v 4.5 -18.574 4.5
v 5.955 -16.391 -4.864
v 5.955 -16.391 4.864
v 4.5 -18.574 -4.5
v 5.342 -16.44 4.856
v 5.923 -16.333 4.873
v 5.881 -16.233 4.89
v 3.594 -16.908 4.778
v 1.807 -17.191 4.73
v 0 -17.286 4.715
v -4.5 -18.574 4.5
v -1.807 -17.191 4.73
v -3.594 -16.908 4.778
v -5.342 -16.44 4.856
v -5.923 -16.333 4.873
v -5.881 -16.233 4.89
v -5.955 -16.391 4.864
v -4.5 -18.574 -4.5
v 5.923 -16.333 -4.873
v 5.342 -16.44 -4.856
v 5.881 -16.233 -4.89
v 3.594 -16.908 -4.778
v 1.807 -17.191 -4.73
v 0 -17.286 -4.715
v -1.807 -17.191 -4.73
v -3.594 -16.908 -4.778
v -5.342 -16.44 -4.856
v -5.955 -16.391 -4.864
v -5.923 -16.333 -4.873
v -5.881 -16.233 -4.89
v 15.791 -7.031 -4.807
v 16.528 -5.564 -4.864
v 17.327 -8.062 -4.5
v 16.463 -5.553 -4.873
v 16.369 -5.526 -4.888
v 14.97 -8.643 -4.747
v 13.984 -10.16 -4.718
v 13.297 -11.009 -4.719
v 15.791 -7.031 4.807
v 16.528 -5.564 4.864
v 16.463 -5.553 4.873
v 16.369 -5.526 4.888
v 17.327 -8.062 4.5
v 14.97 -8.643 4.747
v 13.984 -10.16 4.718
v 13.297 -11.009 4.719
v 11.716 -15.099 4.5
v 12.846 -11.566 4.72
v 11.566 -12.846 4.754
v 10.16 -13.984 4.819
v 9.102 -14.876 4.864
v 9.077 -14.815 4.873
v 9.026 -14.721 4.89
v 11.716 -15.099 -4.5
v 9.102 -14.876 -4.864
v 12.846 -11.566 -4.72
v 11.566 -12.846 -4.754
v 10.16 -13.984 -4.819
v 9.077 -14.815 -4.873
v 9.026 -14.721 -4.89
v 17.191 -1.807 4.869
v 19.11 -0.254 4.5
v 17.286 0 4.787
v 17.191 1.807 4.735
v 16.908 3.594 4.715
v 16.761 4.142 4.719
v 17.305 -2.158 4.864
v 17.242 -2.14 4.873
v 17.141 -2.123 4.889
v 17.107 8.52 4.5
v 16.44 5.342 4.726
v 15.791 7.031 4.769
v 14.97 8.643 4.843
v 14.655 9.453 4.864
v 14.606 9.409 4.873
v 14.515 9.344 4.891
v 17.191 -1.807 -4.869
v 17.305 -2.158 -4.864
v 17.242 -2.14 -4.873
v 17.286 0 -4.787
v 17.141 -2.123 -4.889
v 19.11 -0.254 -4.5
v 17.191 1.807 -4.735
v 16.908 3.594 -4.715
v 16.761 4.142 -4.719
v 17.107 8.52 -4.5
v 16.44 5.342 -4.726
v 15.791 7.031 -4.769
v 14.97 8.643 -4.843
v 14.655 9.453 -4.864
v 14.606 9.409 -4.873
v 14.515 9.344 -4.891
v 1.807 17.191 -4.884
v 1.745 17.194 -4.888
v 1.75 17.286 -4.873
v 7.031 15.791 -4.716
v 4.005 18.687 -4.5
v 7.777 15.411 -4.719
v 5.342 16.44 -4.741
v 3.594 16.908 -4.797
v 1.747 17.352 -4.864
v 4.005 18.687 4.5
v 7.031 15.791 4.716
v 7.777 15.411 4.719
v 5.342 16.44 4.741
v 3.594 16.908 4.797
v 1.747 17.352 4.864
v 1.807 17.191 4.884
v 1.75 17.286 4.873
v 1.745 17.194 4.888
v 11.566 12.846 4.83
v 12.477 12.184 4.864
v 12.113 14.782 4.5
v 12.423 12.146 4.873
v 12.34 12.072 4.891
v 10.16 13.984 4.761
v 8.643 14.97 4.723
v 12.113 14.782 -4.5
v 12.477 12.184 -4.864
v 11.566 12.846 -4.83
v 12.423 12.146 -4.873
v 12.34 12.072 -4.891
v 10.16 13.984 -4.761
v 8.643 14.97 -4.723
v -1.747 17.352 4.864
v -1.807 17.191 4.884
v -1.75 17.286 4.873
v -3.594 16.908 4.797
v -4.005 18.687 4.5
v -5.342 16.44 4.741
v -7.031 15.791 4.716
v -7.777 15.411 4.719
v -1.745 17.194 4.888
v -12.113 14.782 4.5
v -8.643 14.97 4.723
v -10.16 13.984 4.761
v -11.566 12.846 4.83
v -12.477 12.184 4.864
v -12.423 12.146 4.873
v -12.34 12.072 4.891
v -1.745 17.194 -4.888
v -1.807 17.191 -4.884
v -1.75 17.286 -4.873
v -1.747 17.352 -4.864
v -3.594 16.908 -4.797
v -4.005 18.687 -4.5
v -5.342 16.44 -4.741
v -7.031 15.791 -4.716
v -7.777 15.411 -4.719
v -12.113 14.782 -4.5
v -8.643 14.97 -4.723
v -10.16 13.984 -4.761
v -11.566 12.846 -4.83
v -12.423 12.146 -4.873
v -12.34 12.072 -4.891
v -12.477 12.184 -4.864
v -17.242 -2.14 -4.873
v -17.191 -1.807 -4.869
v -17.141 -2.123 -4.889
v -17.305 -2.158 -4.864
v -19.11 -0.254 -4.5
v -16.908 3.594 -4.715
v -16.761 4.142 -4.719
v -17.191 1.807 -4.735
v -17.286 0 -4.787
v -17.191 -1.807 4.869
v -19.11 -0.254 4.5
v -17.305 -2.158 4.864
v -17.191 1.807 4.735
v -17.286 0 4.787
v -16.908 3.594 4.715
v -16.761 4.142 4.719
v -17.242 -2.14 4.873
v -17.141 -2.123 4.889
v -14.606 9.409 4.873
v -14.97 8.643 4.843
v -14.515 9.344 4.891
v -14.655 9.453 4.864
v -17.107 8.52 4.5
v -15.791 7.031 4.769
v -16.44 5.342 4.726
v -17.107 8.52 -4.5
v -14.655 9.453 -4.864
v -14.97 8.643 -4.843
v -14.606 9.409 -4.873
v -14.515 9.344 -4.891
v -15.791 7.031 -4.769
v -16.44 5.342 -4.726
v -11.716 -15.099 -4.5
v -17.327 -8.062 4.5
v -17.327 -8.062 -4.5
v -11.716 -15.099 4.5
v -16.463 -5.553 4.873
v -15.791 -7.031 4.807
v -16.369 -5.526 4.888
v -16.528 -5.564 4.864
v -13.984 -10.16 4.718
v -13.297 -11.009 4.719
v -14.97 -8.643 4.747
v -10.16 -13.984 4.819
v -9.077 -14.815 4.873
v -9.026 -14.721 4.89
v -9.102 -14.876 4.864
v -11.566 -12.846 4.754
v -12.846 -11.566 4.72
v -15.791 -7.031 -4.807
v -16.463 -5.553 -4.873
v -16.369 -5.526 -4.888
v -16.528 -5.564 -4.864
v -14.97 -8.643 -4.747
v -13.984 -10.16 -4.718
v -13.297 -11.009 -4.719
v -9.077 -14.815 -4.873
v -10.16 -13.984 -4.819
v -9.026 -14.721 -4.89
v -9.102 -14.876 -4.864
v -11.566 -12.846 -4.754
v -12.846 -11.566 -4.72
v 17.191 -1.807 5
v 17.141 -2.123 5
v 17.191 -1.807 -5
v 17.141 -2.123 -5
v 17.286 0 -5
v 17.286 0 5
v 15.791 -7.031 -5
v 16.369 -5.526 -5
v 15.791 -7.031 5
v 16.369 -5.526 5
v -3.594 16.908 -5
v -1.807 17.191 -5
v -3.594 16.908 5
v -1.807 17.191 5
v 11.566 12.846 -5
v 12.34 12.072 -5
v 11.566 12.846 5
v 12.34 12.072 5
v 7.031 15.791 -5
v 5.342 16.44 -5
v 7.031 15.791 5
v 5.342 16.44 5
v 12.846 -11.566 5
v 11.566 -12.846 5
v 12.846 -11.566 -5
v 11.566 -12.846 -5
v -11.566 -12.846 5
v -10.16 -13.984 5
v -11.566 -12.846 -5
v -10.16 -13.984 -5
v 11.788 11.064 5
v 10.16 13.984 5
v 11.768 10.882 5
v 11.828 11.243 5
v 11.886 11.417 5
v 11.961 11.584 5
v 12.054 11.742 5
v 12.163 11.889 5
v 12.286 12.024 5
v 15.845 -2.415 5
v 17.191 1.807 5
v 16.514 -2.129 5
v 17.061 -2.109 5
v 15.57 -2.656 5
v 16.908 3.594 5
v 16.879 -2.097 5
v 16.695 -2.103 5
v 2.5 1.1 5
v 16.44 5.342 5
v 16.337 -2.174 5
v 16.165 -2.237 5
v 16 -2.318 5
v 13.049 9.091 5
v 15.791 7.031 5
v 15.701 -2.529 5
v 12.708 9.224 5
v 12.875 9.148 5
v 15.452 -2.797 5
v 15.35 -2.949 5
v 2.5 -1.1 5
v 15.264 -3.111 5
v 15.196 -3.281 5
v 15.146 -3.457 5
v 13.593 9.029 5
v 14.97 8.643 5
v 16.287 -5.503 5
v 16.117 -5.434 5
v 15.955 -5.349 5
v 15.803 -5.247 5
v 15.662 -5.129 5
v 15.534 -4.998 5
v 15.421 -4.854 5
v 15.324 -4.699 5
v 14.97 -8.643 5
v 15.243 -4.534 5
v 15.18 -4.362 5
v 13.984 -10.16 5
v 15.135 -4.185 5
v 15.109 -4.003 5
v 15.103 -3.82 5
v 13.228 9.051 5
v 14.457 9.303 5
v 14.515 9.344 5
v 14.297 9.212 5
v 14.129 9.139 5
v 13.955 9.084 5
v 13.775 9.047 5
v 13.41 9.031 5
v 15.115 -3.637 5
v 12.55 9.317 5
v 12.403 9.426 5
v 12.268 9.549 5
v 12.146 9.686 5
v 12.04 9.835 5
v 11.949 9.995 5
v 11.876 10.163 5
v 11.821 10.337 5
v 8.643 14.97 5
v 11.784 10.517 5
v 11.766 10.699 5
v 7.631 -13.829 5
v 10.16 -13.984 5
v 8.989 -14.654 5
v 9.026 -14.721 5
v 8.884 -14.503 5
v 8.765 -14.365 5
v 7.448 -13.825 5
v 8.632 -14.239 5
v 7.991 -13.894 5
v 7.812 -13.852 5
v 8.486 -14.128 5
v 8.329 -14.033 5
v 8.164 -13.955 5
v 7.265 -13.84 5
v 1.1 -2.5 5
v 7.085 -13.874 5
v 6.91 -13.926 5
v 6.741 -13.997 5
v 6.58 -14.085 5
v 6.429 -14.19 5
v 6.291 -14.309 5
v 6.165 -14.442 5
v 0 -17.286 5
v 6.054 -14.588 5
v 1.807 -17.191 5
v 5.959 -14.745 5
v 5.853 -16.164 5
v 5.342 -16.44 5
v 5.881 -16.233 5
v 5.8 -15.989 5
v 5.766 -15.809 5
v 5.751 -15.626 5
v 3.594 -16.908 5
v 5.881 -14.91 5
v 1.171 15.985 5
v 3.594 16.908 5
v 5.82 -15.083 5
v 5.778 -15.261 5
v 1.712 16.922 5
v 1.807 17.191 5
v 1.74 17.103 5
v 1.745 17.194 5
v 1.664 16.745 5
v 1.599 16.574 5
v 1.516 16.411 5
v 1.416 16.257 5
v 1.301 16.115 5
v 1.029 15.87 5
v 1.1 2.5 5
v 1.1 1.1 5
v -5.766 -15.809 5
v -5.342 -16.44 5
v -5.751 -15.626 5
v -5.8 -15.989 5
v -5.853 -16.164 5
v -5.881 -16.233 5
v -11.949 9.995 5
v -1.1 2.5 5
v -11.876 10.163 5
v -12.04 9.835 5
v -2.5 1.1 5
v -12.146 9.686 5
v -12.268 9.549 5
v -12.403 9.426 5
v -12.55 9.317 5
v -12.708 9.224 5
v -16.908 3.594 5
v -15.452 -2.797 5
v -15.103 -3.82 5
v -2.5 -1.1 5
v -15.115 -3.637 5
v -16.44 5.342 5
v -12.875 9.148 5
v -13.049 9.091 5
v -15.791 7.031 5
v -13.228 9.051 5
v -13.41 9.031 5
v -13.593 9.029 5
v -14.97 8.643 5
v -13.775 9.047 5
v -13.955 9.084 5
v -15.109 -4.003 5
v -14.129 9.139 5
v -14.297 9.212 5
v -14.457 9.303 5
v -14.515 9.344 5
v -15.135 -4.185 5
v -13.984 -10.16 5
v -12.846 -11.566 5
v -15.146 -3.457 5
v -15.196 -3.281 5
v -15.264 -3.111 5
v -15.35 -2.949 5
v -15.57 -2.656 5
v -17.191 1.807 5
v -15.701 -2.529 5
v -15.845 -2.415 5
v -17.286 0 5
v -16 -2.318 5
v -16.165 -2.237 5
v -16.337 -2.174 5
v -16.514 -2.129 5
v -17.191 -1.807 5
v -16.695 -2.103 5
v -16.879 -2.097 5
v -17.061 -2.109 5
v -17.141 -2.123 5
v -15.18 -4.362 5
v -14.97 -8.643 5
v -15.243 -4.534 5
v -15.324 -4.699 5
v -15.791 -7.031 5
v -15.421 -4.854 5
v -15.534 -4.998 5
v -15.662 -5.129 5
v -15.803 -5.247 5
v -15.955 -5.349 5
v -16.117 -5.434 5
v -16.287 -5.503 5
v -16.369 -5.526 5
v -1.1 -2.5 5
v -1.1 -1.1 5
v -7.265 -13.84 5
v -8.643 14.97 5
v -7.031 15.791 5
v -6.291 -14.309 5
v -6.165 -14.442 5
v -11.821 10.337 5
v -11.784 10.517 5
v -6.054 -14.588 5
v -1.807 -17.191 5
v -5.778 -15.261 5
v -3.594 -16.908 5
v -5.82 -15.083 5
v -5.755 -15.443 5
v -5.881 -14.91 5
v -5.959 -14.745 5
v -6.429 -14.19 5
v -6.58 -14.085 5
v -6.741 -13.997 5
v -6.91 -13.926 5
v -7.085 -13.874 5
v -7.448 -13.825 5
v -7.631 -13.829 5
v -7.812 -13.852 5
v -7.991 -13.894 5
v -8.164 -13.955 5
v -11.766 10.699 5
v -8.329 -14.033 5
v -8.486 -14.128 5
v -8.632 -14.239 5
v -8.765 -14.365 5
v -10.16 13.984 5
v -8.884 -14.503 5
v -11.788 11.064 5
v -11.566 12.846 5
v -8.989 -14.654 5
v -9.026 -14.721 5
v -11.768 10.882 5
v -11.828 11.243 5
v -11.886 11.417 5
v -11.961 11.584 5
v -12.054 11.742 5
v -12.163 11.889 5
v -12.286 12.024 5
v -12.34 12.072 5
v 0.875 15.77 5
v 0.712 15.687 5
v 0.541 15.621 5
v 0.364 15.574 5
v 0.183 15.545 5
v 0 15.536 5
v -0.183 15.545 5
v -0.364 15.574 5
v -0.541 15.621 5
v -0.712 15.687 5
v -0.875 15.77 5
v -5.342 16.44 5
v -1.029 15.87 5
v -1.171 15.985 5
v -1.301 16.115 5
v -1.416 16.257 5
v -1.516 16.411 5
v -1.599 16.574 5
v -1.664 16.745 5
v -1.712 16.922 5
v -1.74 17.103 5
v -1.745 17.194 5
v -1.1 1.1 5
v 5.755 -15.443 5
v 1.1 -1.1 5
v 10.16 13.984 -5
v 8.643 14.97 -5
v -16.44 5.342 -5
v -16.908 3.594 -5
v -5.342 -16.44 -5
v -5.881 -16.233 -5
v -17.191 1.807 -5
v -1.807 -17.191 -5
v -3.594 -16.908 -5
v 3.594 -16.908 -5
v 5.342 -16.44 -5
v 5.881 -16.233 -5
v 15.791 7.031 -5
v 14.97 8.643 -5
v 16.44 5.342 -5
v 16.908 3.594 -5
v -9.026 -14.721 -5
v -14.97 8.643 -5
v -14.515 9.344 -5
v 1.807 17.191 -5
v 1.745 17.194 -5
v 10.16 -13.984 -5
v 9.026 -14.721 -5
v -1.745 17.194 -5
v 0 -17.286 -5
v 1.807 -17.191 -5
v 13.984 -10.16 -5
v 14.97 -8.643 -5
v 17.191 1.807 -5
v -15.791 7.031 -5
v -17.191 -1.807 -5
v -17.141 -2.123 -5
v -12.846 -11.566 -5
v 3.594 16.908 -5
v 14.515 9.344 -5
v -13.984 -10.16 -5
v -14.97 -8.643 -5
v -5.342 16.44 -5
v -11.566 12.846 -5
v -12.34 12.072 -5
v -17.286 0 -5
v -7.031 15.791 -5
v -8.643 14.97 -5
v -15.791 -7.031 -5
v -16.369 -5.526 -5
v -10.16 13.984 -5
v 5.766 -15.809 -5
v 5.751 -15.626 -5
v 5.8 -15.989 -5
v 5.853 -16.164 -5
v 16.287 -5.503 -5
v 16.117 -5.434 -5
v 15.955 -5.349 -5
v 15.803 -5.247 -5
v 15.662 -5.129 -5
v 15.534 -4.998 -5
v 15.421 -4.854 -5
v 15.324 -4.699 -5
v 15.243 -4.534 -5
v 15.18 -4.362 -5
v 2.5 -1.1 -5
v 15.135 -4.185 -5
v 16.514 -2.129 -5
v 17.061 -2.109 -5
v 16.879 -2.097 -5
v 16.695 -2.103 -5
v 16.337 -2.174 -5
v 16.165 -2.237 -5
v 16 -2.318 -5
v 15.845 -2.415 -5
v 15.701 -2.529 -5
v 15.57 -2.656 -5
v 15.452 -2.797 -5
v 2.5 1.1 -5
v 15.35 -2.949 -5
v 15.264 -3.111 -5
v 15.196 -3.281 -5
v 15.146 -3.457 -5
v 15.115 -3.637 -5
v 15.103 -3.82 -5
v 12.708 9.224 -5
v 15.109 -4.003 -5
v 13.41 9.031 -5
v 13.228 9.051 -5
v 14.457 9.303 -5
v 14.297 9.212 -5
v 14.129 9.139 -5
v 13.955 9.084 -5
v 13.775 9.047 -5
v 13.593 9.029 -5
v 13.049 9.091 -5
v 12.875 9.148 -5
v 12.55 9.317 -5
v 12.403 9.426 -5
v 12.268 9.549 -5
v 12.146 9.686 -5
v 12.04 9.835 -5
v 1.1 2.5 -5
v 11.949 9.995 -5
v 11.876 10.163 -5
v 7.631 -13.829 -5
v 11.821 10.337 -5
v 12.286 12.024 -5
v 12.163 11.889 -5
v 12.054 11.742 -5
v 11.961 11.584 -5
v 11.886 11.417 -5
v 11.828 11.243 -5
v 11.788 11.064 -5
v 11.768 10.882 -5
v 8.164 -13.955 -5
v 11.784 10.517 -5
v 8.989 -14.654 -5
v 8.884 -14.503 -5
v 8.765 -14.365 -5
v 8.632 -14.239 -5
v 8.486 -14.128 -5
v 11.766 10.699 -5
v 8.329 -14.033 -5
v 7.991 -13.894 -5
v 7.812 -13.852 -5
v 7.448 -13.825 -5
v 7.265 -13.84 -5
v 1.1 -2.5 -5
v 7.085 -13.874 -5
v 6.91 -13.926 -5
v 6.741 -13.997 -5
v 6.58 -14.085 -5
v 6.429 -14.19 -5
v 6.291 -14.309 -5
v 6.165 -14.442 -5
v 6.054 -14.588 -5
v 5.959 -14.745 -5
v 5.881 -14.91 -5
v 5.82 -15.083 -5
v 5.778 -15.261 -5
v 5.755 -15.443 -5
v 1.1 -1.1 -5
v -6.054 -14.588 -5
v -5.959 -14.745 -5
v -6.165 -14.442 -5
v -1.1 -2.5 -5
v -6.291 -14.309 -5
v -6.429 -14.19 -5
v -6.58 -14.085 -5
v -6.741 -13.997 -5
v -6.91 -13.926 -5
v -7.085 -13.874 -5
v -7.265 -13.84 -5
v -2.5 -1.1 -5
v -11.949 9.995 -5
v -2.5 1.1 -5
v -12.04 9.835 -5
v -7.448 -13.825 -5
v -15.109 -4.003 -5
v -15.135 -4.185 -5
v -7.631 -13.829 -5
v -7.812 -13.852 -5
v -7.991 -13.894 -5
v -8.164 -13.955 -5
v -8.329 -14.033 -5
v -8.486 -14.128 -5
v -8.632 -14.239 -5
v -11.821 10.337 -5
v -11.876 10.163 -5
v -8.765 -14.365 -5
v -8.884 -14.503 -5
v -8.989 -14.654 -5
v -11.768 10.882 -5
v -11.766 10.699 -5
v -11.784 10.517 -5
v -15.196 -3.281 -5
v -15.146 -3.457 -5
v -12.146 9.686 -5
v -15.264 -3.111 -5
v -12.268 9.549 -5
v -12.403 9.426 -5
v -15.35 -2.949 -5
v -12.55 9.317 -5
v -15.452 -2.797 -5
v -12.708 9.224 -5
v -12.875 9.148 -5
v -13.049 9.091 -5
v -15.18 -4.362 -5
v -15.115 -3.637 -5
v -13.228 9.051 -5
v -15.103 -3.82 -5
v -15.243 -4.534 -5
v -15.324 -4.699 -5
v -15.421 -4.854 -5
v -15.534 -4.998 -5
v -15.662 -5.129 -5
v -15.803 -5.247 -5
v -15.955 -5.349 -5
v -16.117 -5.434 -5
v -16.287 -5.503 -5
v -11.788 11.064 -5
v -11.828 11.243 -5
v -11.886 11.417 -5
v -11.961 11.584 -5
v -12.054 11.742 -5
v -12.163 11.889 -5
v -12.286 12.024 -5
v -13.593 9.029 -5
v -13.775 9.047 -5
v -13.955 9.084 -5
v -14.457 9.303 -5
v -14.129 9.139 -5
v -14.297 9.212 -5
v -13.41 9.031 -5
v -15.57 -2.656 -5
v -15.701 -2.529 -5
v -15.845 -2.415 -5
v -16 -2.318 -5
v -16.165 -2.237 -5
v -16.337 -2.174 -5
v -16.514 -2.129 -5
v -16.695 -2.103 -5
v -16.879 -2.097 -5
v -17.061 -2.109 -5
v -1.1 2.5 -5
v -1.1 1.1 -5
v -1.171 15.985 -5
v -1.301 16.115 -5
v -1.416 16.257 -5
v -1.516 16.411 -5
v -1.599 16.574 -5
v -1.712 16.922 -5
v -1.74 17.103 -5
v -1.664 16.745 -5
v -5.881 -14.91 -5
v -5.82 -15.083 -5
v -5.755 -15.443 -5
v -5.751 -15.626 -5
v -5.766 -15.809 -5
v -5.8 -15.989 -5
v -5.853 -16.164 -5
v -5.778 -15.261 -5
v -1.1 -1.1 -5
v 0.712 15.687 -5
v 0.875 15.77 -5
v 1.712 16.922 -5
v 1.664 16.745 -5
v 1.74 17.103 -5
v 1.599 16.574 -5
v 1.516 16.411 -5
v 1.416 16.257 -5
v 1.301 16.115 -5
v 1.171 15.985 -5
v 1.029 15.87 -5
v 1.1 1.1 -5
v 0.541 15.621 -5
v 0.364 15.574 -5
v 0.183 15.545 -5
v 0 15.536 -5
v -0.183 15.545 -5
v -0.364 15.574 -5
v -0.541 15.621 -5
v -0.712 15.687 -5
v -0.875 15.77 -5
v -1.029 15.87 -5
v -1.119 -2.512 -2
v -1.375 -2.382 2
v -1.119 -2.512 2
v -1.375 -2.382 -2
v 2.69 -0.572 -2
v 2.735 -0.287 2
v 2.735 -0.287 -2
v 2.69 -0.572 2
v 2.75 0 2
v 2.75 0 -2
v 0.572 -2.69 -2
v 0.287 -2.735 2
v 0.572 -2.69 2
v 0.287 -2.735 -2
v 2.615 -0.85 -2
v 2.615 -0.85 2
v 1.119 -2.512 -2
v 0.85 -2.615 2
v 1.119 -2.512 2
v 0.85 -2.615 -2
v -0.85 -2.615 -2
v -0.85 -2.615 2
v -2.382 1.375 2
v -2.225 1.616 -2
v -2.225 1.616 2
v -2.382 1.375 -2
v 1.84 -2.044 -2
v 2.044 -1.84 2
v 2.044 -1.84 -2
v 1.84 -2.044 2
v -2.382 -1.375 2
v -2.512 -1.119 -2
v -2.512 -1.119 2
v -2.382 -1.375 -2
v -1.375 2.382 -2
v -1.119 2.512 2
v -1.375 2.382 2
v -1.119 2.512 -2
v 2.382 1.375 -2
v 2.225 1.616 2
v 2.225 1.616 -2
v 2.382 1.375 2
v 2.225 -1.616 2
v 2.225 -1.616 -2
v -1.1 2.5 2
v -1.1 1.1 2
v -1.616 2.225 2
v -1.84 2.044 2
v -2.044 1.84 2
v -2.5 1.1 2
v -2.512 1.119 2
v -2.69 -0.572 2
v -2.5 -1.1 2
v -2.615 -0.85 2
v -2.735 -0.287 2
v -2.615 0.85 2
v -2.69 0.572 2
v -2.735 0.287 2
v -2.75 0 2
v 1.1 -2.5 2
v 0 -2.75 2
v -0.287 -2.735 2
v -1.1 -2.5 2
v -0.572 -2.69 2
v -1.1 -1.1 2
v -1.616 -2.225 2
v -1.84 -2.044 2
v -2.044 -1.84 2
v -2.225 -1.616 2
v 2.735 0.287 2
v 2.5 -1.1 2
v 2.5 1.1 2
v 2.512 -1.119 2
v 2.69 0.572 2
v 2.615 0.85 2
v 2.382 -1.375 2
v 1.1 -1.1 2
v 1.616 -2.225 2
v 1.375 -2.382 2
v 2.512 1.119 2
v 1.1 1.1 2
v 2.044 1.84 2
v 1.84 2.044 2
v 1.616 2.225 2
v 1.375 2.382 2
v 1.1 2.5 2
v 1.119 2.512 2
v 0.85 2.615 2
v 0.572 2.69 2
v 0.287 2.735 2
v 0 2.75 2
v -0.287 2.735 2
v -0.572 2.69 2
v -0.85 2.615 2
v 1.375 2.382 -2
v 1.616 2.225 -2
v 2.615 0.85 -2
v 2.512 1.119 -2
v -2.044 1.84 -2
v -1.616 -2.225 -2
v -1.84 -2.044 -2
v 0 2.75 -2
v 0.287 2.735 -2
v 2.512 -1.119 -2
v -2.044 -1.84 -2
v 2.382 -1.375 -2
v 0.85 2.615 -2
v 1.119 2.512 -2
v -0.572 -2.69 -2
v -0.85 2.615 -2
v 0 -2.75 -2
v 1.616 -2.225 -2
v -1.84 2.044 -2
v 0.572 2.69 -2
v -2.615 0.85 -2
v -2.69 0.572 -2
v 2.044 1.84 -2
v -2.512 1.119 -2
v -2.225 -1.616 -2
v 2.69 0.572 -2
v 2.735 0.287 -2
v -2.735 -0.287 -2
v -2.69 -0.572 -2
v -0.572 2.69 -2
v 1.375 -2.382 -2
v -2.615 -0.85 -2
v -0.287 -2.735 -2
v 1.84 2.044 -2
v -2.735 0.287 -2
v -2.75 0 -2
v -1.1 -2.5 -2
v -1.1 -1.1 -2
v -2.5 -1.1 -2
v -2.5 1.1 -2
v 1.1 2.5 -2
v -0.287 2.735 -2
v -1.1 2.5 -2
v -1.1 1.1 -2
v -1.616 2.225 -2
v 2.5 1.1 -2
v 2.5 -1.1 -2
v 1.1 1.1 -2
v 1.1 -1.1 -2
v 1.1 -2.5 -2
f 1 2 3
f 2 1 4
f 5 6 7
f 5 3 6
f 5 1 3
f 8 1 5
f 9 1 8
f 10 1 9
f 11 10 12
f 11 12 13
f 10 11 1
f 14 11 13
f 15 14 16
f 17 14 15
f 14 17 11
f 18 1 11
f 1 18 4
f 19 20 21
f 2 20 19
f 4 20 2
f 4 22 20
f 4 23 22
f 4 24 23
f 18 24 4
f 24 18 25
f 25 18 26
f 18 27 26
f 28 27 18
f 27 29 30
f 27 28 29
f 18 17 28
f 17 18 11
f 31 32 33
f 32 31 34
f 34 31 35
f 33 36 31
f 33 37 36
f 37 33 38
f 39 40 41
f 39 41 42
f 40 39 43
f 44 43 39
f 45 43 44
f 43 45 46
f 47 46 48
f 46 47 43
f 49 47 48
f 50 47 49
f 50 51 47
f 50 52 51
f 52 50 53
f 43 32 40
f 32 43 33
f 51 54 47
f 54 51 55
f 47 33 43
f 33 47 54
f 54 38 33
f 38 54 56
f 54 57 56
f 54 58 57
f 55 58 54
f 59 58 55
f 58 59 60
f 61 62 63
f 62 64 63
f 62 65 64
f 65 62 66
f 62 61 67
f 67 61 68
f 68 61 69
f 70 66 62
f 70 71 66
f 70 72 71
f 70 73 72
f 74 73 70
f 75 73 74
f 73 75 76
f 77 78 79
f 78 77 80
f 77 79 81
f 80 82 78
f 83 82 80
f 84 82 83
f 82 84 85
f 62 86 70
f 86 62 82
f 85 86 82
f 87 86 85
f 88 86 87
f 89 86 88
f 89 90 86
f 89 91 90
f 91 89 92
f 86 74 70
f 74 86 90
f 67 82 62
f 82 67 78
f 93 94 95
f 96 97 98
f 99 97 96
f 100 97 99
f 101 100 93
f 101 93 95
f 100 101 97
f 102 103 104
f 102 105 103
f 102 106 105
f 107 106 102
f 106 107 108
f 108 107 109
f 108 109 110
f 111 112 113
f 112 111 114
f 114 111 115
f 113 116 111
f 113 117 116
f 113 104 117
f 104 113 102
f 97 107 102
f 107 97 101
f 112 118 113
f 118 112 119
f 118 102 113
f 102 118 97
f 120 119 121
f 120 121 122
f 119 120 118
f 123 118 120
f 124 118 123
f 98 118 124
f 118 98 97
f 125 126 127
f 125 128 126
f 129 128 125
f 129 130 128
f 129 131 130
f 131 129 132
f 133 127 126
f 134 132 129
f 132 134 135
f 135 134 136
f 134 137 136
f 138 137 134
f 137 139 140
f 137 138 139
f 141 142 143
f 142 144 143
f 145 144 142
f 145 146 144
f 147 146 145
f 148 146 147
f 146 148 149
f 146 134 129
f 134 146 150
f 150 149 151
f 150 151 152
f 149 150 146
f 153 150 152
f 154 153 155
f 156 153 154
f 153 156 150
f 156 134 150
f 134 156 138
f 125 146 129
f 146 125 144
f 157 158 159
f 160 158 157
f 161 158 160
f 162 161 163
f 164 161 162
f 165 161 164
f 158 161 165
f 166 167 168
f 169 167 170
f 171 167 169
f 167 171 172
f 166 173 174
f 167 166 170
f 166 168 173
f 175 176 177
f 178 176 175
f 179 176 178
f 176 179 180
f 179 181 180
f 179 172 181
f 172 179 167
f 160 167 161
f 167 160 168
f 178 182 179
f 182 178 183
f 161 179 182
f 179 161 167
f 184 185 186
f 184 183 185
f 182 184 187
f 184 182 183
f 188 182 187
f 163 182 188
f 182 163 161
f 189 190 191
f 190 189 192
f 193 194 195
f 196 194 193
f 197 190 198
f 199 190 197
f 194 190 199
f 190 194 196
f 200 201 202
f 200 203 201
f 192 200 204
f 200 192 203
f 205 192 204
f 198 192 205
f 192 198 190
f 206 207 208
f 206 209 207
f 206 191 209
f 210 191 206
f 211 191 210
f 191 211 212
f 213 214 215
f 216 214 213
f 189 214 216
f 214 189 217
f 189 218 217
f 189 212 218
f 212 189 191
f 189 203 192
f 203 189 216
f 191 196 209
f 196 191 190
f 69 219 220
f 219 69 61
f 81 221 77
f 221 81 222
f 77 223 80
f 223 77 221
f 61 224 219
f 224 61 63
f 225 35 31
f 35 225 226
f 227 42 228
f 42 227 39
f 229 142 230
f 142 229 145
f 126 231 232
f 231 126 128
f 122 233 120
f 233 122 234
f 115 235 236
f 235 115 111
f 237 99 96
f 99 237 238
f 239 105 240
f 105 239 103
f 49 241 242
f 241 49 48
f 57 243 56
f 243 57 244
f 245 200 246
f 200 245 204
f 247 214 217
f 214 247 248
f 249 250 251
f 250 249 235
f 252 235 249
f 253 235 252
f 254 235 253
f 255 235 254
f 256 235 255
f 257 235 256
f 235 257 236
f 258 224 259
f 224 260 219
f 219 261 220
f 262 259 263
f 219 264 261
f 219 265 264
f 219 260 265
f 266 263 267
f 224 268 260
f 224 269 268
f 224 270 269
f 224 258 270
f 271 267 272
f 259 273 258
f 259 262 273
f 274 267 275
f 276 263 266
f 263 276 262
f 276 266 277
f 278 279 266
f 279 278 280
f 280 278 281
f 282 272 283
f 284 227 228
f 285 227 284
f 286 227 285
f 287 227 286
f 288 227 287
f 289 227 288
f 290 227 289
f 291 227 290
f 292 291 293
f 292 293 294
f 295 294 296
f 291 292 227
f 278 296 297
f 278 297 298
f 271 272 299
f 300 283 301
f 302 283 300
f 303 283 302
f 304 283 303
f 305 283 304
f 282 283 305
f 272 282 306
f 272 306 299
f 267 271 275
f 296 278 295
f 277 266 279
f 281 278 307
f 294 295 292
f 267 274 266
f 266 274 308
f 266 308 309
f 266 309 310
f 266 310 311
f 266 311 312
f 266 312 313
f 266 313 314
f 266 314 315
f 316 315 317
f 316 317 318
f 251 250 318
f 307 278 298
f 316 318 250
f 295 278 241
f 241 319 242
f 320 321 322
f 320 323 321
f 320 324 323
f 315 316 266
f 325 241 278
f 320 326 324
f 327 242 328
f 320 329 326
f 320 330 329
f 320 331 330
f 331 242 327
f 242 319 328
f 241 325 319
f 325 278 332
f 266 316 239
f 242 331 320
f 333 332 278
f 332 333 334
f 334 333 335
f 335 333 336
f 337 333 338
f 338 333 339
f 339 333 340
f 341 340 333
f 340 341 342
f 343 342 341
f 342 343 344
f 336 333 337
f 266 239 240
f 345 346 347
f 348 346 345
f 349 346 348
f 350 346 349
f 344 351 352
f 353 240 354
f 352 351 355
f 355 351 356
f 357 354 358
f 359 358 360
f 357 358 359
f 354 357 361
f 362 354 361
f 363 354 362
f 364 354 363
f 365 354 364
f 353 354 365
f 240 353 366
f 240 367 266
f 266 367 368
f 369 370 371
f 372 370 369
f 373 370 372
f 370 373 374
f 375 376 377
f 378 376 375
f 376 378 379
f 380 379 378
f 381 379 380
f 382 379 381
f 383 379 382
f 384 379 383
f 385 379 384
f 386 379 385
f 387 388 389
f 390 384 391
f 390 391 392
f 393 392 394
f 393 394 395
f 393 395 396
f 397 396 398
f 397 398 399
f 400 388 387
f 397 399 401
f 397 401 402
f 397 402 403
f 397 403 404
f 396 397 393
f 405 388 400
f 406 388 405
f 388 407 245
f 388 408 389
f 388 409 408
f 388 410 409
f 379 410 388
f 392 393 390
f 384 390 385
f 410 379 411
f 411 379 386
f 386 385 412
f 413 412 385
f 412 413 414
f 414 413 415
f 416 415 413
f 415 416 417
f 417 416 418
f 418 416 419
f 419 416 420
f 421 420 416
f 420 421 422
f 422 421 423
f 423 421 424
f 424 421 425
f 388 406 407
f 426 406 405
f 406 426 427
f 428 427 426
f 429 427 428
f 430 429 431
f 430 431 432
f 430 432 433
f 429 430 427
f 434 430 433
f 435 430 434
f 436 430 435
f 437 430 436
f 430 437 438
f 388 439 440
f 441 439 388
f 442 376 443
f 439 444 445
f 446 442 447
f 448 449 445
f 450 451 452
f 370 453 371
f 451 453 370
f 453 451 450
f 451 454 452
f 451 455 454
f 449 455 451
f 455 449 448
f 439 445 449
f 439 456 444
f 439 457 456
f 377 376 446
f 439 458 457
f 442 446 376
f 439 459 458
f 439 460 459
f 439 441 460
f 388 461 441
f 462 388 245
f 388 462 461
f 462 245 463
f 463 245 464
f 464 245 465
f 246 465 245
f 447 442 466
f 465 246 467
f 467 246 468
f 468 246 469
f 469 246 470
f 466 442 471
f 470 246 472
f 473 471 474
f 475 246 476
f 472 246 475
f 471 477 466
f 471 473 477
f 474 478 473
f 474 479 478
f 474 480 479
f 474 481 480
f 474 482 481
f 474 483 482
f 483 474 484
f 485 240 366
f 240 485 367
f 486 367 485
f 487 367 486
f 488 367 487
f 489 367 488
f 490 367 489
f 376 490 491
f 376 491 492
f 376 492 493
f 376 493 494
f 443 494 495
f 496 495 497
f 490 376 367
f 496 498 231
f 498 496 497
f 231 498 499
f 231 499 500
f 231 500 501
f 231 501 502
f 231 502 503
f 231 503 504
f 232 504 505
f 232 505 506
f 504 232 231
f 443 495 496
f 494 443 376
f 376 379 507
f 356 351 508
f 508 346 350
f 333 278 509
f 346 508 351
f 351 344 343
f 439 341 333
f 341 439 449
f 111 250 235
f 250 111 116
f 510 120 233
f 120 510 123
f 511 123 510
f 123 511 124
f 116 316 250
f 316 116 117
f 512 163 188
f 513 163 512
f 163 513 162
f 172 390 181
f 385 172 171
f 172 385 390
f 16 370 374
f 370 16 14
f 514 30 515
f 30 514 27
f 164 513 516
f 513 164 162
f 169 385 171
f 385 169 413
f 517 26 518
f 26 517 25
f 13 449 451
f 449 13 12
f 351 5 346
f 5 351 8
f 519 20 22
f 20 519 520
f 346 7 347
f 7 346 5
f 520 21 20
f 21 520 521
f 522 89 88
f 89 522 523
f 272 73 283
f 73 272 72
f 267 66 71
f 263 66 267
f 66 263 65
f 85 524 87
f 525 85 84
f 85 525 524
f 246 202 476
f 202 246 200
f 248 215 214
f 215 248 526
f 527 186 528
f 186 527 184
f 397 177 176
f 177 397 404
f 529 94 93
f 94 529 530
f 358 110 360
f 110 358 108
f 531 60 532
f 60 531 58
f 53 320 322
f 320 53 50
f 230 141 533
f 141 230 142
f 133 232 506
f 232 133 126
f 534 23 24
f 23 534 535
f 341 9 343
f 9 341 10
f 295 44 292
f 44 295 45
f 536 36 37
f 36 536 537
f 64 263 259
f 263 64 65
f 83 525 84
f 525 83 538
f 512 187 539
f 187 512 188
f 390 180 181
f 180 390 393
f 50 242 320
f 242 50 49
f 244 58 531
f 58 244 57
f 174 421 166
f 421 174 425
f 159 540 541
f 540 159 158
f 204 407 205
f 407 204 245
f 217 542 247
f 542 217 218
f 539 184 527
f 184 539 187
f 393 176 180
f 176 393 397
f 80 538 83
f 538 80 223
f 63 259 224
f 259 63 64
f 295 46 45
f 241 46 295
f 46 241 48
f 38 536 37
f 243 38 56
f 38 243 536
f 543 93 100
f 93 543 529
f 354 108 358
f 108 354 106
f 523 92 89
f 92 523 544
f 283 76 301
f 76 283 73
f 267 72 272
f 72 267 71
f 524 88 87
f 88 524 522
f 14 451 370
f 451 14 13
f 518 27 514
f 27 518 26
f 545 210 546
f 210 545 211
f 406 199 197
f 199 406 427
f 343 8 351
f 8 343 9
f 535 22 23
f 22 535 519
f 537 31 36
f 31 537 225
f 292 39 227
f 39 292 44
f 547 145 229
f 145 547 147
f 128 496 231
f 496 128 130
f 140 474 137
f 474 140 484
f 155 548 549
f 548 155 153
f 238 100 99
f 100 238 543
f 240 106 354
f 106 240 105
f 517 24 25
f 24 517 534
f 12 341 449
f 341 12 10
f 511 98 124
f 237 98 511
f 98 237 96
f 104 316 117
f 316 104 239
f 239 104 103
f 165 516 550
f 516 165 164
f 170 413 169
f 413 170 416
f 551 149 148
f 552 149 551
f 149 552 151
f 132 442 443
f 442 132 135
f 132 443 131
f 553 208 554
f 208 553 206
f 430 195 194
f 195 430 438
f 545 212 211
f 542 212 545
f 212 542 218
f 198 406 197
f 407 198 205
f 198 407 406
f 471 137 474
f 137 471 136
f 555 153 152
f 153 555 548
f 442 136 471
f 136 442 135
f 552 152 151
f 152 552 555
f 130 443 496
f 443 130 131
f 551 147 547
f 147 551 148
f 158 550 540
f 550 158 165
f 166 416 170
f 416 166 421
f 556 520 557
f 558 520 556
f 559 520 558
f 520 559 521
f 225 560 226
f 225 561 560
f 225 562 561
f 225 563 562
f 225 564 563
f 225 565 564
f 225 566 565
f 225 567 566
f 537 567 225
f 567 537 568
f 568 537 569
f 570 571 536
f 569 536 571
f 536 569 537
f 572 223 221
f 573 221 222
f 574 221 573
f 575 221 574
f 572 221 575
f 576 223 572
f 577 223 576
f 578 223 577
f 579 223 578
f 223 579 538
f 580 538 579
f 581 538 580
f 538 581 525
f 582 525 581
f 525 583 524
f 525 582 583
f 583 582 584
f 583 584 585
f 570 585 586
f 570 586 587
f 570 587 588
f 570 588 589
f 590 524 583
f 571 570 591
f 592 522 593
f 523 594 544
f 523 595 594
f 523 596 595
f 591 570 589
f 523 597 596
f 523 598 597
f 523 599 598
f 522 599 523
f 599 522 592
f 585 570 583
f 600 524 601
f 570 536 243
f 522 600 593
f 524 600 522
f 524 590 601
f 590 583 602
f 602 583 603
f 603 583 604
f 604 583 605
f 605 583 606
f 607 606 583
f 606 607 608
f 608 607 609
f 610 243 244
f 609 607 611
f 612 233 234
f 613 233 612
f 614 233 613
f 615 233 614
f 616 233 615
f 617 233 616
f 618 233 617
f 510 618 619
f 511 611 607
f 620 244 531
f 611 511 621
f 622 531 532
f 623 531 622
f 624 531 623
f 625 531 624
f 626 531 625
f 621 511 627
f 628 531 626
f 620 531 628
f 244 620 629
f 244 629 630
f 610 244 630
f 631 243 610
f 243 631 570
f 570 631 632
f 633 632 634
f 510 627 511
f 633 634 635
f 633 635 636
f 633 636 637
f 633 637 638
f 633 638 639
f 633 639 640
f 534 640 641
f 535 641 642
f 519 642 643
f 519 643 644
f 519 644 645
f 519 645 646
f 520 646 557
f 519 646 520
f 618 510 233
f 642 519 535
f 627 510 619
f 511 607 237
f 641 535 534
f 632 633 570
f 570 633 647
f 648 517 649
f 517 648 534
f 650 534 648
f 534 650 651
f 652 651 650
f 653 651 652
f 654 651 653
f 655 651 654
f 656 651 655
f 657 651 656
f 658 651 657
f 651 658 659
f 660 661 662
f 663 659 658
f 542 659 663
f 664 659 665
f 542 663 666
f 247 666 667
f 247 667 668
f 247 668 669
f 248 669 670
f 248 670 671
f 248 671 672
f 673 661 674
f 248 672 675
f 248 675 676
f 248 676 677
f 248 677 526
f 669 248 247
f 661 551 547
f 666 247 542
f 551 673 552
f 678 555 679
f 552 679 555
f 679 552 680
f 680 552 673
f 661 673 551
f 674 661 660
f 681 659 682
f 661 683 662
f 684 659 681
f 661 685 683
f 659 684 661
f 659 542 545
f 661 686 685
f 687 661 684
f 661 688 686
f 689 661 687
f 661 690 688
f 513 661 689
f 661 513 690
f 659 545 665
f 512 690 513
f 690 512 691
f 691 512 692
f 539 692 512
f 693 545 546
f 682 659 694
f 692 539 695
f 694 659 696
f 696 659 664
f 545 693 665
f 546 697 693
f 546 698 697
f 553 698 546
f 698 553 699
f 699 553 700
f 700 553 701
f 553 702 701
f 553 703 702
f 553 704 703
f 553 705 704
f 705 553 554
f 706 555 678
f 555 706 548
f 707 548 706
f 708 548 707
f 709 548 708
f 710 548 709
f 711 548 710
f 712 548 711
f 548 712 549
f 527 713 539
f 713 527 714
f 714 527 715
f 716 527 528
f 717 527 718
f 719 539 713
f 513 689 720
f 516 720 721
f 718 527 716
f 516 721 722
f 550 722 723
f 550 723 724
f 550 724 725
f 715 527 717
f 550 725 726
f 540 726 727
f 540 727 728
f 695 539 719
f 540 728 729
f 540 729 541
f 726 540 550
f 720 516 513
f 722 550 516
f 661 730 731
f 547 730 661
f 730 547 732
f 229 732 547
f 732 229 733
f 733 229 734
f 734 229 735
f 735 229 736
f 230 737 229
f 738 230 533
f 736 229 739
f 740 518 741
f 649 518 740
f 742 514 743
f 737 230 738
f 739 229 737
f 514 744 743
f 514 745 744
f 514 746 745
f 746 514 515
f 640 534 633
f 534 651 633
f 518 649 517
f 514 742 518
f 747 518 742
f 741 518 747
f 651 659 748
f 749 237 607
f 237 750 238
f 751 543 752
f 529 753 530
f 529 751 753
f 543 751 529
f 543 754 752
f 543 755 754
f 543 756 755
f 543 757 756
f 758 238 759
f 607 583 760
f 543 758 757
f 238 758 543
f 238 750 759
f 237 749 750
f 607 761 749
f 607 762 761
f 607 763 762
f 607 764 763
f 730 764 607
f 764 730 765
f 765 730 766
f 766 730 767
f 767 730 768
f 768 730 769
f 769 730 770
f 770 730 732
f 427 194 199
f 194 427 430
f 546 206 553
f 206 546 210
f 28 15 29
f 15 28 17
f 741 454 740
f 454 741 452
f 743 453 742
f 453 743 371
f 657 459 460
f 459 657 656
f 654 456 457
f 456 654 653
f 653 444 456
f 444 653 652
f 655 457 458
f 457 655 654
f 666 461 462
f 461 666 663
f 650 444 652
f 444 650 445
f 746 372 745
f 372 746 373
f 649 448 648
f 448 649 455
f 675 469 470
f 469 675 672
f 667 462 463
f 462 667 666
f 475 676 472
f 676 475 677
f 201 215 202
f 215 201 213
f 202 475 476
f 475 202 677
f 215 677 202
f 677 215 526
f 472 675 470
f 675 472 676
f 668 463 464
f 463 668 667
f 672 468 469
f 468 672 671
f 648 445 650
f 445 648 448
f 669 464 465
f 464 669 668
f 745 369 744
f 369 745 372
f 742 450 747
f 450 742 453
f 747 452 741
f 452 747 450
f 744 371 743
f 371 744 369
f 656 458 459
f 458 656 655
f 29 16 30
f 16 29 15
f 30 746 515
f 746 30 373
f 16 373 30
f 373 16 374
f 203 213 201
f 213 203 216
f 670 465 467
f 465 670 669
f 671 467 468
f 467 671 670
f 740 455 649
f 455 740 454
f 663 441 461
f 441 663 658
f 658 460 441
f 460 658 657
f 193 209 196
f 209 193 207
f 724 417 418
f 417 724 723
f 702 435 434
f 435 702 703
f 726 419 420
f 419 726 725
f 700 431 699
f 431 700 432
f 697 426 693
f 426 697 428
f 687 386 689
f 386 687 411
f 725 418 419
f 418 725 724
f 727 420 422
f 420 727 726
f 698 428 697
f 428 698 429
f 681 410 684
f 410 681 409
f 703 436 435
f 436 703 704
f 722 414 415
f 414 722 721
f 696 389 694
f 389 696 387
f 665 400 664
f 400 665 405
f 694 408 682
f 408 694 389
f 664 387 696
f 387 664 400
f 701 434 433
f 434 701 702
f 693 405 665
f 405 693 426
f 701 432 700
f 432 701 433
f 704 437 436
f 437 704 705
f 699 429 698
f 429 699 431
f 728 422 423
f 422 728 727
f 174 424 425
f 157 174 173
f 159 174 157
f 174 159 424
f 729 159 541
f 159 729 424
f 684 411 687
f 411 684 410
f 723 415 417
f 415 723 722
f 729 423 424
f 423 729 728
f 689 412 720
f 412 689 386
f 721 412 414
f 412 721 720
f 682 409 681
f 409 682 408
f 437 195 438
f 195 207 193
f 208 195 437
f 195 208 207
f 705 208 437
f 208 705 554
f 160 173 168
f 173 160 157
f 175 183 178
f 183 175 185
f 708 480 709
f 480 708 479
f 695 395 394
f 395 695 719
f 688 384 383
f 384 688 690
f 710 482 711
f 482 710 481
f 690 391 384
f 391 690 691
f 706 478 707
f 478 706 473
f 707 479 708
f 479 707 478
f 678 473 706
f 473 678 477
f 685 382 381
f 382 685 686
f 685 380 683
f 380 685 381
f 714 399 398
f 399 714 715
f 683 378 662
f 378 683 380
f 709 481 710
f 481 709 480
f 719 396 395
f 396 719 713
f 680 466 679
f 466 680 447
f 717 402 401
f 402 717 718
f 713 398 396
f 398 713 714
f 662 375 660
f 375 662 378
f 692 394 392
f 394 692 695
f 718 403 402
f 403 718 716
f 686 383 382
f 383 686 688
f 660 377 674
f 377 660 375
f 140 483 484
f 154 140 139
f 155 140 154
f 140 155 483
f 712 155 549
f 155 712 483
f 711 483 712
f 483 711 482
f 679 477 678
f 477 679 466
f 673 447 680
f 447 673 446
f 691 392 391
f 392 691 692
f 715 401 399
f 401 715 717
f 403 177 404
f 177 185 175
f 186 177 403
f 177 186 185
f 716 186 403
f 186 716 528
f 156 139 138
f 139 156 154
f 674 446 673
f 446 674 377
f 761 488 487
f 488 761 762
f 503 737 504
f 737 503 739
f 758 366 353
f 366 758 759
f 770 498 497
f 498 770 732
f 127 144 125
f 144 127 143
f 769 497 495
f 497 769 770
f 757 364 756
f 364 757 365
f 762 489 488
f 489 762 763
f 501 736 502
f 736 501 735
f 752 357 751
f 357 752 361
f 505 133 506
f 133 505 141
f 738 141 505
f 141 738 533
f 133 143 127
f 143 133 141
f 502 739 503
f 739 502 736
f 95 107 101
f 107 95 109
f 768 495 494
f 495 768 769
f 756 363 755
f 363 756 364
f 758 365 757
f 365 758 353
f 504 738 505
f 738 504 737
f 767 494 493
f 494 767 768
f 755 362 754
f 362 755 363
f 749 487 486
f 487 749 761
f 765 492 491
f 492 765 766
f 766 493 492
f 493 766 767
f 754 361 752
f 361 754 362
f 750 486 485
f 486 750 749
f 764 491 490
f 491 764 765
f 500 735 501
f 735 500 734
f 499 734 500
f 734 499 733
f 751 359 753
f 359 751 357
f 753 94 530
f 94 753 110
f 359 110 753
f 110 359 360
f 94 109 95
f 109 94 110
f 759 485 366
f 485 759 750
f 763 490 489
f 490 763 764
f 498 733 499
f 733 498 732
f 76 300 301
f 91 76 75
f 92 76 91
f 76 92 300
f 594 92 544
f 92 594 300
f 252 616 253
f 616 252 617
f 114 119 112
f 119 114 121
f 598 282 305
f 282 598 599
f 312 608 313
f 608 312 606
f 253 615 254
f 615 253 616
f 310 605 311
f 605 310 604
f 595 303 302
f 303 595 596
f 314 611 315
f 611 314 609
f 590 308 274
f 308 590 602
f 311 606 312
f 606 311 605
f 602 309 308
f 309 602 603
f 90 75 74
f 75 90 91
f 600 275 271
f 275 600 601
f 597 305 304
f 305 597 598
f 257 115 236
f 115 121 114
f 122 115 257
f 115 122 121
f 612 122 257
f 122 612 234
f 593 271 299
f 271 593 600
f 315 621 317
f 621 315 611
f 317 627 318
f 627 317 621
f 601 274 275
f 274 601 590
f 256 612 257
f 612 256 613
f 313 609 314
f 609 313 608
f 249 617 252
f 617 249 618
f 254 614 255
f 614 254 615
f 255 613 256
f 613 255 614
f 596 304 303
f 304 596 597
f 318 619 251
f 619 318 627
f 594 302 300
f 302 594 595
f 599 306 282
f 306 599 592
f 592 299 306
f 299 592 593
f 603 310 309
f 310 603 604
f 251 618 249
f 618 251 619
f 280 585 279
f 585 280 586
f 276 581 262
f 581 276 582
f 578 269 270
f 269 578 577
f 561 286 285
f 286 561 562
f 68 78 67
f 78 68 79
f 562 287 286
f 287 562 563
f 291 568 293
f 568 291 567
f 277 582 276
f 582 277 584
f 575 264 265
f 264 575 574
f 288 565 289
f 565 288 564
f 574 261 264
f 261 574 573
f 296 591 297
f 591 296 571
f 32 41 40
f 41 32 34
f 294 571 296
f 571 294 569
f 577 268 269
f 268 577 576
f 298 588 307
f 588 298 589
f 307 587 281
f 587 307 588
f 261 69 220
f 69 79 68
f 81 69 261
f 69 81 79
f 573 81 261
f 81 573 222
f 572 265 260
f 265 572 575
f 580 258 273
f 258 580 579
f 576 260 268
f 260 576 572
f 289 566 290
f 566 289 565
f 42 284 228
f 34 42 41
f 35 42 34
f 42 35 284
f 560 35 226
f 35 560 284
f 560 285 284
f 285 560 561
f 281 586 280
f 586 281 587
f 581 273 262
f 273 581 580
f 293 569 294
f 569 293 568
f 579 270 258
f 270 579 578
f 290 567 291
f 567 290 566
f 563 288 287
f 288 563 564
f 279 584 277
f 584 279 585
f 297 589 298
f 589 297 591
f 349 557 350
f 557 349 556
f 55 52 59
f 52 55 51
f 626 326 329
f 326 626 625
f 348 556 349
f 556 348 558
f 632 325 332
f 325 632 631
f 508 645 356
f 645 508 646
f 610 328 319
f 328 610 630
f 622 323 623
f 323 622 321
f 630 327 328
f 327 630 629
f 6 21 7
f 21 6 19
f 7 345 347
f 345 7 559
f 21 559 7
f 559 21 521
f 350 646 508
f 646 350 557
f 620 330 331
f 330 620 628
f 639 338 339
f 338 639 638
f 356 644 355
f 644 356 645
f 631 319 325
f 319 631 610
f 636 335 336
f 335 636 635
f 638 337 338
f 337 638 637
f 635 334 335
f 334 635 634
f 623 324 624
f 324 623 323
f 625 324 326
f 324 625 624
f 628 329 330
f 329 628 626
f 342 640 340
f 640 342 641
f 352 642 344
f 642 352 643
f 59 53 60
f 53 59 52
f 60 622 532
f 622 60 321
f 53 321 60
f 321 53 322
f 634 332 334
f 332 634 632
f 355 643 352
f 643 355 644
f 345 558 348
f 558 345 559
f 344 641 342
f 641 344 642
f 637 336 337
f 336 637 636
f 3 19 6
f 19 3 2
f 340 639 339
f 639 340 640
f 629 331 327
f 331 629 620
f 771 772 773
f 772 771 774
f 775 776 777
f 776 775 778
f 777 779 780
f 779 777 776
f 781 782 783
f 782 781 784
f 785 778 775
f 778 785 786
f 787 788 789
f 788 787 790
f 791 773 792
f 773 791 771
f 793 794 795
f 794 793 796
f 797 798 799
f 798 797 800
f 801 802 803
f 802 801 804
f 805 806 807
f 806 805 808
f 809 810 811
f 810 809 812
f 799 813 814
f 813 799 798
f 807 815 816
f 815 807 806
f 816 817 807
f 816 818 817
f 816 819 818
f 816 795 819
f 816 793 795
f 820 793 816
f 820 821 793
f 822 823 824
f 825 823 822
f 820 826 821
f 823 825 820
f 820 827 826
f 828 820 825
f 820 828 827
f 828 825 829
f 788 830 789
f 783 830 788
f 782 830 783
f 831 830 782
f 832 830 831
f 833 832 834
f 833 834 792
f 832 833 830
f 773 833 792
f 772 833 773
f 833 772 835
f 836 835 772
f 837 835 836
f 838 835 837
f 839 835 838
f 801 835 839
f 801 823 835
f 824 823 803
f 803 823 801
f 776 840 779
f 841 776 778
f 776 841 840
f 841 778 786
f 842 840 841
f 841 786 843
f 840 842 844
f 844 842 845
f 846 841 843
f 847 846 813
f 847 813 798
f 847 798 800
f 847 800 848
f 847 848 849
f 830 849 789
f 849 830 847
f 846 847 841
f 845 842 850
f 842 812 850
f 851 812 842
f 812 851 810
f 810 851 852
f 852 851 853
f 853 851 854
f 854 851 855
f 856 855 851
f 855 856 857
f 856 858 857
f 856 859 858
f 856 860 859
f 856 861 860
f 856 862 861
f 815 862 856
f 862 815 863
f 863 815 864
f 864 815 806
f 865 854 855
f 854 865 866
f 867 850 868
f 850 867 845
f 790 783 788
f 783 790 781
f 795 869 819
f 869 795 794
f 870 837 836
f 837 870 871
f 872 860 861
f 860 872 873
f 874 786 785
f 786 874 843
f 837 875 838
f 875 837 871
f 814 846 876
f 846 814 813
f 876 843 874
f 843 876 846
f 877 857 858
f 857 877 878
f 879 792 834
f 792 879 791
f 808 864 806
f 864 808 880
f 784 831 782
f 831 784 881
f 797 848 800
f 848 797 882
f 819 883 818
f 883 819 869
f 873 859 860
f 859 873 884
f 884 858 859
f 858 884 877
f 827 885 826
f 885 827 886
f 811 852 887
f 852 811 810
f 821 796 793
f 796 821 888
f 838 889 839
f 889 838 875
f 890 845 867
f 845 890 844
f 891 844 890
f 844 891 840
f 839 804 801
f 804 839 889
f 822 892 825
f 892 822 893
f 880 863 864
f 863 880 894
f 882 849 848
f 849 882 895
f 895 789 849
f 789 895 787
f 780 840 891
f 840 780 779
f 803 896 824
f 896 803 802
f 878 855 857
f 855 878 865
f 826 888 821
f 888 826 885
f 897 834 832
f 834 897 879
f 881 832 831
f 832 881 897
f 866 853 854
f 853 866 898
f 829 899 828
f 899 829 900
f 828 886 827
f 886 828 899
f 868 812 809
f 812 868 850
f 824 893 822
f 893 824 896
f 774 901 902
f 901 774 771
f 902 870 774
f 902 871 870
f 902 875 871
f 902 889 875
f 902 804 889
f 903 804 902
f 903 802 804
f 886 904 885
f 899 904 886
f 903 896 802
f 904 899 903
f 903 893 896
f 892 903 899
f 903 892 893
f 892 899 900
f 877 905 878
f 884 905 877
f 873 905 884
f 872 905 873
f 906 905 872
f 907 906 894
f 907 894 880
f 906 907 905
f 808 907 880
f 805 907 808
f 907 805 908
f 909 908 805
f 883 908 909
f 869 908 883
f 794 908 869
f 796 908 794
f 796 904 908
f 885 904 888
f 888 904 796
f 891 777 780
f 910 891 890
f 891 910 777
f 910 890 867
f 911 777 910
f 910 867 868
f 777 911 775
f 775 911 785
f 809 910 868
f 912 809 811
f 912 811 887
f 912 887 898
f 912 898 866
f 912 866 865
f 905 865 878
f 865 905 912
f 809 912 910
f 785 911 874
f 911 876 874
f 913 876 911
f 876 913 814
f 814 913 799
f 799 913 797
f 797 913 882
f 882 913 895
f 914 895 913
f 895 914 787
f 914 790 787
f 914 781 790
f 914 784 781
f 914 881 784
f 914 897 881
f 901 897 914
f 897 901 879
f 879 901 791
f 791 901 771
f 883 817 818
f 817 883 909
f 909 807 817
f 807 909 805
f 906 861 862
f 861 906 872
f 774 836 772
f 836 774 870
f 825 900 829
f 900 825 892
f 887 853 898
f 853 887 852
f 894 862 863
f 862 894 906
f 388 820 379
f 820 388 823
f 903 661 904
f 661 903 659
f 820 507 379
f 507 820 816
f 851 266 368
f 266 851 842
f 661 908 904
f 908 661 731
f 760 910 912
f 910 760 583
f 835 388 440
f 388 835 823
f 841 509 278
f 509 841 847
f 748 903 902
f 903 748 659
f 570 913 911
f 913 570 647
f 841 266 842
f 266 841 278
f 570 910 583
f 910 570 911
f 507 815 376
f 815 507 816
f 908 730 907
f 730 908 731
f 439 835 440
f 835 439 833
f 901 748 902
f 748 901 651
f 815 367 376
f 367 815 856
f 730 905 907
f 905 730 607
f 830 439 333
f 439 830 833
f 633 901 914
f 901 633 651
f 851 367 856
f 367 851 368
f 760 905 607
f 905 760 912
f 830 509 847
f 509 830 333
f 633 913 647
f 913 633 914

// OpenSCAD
$fn=60;

module bolt()
{
    screw_d = 2;
    screw_length = 30;
    head_d = 4;
    head_length = 2;
    union()
    {
        translate([0,0,screw_length/2]) cylinder(screw_length,screw_d/2,screw_d/2,center=true);
        translate([0,0,-head_length/2]) cylinder(head_length,head_d/2,head_d/2,center=true);
    }
}

module tread_segment()
{  
    spacing = 15.0;
    mount_width = 4;
    mount_height = 6;
    thread_id = 2.4;
    slip_id = 3.0;
    
    width1 = 30 - mount_width;
    width2 = width1-(mount_width*2)-1.5;
    
    track_thickness = 2.5;
    tread_gap = 1;
    hinge_space = mount_height+4;
    
    
    module v_grove()
    {
        gap = 2.5;
        length = 40;
        rotate([0,0,45]) translate([(length-gap)/2,0,0]) cube([length,gap,track_thickness],center=true);
        rotate([0,0,-45]) translate([(length-gap)/2,0,0]) cube([length,gap,track_thickness],center=true);
    }
    
    module tread_base()
    {
        tread_width = 30 + 2*10;
        tread_length = spacing - tread_gap;
        difference()
        {
            union()
            {
                cube([tread_length,tread_width,track_thickness],center=true);
                translate([0,(tread_width-track_thickness)/2,track_thickness]) cube([tread_length,track_thickness,track_thickness],center=true);
                translate([0,-(tread_width-track_thickness)/2,track_thickness]) cube([tread_length,track_thickness,track_thickness],center=true);
            }
            translate([tread_length-3,0,track_thickness]) rotate([0,0,5]) cube([tread_length/2,tread_width*2,track_thickness*3+0.1],center=true);
            translate([tread_length-3,0,track_thickness]) rotate([0,0,-5]) cube([tread_length/2,tread_width*2,track_thickness*3+0.1],center=true);
            translate([-tread_length+3,0,track_thickness]) rotate([0,0,5]) cube([tread_length/2,tread_width*2,track_thickness*3+0.1],center=true);
            translate([-tread_length+3,0,track_thickness]) rotate([0,0,-5]) cube([tread_length/2,tread_width*2,track_thickness*3+0.1],center=true);
            
            //translate([0,0,-track_thickness+0.4]) cube([1,tread_width,track_thickness],center=true);
            
            translate([0,0,-track_thickness+0.8]) v_grove();
            translate([-10,0,-track_thickness+0.8]) v_grove();
            translate([-20,0,-track_thickness+0.8]) v_grove();
        }
    }
    
    
    module bolt_mount(length = 10, id=slip_id)
    {
        mount_height1 = mount_height + 3;
        difference()
        {
            union()
            {
                translate([-(length-mount_height/2)/2,0,0]) cube([length-mount_height/2,mount_width,mount_height],center=true);
                //translate([0,0,-mount_height/2+1]) rotate([0,45,0]) translate([0,0,-1]) cube([mount_height/2,mount_width,mount_height-1],center=true);
                translate([-1.5,0,0]) difference()
                {
                    rotate([90,0,0]) cylinder(mount_width,mount_height1/2,mount_height1/2,center=true);
                    translate([0,0,mount_height1/4]) cube([mount_height1,mount_width+0.1,mount_height1/2],center=true);
                }
                rotate([90,0,0]) cylinder(mount_width,mount_height/2,mount_height/2,center=true);
            }
            rotate([90,0,0]) cylinder(mount_width+0.1,id/2,id/2,center=true);
        }
    }
    difference()
    {
        union()
        {
            translate([spacing/2,width1/2,0]) bolt_mount();
            translate([spacing/2,-width1/2,0]) bolt_mount(id=2.2);
            translate([-spacing/2,width2/2,0]) rotate([0,0,180]) bolt_mount();
            translate([-spacing/2,-width2/2,0]) rotate([0,0,180]) bolt_mount();
            //manual configured cross pieces
            translate([0,(width1+width2)/4,0]) rotate([0,0,55]) cube([8,mount_width,mount_height],center=true);
            translate([0,-(width1+width2)/4,0]) rotate([0,0,-55]) cube([8,mount_width,mount_height],center=true);
            //base track
            translate([0,0,-(mount_height+track_thickness)/2]) tread_base();
            
        }
        //cutoff base
        translate([0,0,-(mount_height+track_thickness*3)/2]) cube([100,100,track_thickness],center=true);
        //cutout space for opposate hinges
        translate([spacing/2,width2/2,0]) rotate([90,0,0]) cylinder(mount_width+1,hinge_space/2,hinge_space/2,center=true);
        translate([spacing/2,-width2/2,0]) rotate([90,0,0]) cylinder(mount_width+1,hinge_space/2,hinge_space/2,center=true);
        translate([-spacing/2,width1/2,0]) rotate([90,0,0]) cylinder(mount_width+1,hinge_space/2,hinge_space/2,center=true);
        translate([-spacing/2,-width1/2,0]) rotate([90,0,0]) cylinder(mount_width+1,hinge_space/2,hinge_space/2,center=true);
    }
}

module drive_gear()
{
    
inner_diameter = 5.5;
inner_length = 5.0;
inner_width = 2.2;
    
    bolt_d = 3;
    sp = 15;
    width = 11;
    width1 = 8;
    wheel_diameter = sqrt(pow(sp,2)+pow(sp*(1+2/sqrt(2)),2));
    wheel_diameter1 = wheel_diameter + 3;
    echo(wheel_diameter=wheel_diameter);
    module cutout()
    {
        difference()
        {
            union()
            {
                cylinder(width+0.1,bolt_d/2,bolt_d/2,center=true);
                cube([bolt_d/2,bolt_d*2,width+0.1],center=true);
            }
            translate([-bolt_d/3,bolt_d*.9,0]) cylinder(width+0.1,bolt_d/2,bolt_d/2,center=true);
            translate([-bolt_d/3,-bolt_d*.9,0]) cylinder(width+0.1,bolt_d/2,bolt_d/2,center=true);
        }
    }
    difference()
    {
        union()
        {
            cylinder(width1,wheel_diameter1/2,wheel_diameter1/2,center=true);
            translate([0,0,(width-(width-width1)/2)/2]) cylinder((width-width1)/2,wheel_diameter1/2,wheel_diameter/2,center=true);
            translate([0,0,-(width-(width-width1)/2)/2]) cylinder((width-width1)/2,wheel_diameter/2,wheel_diameter1/2,center=true);
        }
        for(i=[0:8])
        {
            rotate([0,0,i*360/8]) translate([(wheel_diameter+bolt_d/2)/2,0,0]) cutout();
        }
        cylinder(5, inner_diameter/2,inner_diameter/2,center=true);
        cube([inner_length,inner_width, width+0.1],center=true);
        cube([inner_width, inner_length, width+0.1],center=true);
    }
}

module drive_gear1(num_teeth = 5)
{
    base_width = 10.0;
    base_length = 13.0;
    top_width = 9;
    top_length = 9;
    height = 3;
    module gear_tooth()
    {
        Points = [
        [ -base_width/2, -base_length/2,  0 ],  //0
        [ base_width/2,  -base_length/2,  0 ],  //1
        [ base_width/2,  base_length/2,  0 ],  //2
        [ -base_width/2, base_length/2,  0 ],  //3
        [ -top_width/2, -top_length/2,  height ],  //4
        [ top_width/2,  -top_length/2,  height ],  //5
        [ top_width/2,  top_length/2,  height ],  //6
        [ -top_width/2, top_length/2,  height ]]; //7
        Faces = [
        [0,1,2,3],  // bottom
        [4,5,1,0],  // front
        [7,6,5,4],  // top
        [5,6,2,1],  // right
        [6,7,3,2],  // back
        [7,4,0,3]]; // left
        rotate([0,0,90]) polyhedron( Points, Faces );
    }
    
    spacing = 15;
    cutout_d = 3.5;
    
    inner_diameter = 5.5;
    inner_length = 5.0;
    inner_width = 2.2;
    
    diameter = (spacing)/sin(360/(num_teeth*2));
    tooth_d = (spacing/2)/tan(360/(num_teeth*2));
    difference()
    {
        union()
        {
            rotate([90,0,0]) cylinder(base_width, diameter/2,diameter/2,center=true);
        
            for(i=[0:num_teeth])
            {
                rotate([0,i*(360/num_teeth),0]) translate([0,0,tooth_d]) gear_tooth();
            }
        }
        for(i=[0:num_teeth])
        {
            rotate([90,0,0])  rotate([0,0,(i+0.5)*(360/num_teeth)])  translate([0,diameter/2,0]) cylinder(base_width+0.1, cutout_d/2,cutout_d/2,center=true);
        }
        rotate([90,0,0]) cylinder(base_width-6, inner_diameter/2,inner_diameter/2,center=true);
        rotate([90,0,0]) cube([inner_length,inner_width, base_width+0.1],center=true);
        rotate([90,0,0]) cube([inner_width, inner_length, base_width+0.1],center=true);
    }
}

//translate([15/2,30/2,0]) rotate([90,0,0]) bolt();
//tread_segment();
rotate([90,0,0]) drive_gear1(7);
